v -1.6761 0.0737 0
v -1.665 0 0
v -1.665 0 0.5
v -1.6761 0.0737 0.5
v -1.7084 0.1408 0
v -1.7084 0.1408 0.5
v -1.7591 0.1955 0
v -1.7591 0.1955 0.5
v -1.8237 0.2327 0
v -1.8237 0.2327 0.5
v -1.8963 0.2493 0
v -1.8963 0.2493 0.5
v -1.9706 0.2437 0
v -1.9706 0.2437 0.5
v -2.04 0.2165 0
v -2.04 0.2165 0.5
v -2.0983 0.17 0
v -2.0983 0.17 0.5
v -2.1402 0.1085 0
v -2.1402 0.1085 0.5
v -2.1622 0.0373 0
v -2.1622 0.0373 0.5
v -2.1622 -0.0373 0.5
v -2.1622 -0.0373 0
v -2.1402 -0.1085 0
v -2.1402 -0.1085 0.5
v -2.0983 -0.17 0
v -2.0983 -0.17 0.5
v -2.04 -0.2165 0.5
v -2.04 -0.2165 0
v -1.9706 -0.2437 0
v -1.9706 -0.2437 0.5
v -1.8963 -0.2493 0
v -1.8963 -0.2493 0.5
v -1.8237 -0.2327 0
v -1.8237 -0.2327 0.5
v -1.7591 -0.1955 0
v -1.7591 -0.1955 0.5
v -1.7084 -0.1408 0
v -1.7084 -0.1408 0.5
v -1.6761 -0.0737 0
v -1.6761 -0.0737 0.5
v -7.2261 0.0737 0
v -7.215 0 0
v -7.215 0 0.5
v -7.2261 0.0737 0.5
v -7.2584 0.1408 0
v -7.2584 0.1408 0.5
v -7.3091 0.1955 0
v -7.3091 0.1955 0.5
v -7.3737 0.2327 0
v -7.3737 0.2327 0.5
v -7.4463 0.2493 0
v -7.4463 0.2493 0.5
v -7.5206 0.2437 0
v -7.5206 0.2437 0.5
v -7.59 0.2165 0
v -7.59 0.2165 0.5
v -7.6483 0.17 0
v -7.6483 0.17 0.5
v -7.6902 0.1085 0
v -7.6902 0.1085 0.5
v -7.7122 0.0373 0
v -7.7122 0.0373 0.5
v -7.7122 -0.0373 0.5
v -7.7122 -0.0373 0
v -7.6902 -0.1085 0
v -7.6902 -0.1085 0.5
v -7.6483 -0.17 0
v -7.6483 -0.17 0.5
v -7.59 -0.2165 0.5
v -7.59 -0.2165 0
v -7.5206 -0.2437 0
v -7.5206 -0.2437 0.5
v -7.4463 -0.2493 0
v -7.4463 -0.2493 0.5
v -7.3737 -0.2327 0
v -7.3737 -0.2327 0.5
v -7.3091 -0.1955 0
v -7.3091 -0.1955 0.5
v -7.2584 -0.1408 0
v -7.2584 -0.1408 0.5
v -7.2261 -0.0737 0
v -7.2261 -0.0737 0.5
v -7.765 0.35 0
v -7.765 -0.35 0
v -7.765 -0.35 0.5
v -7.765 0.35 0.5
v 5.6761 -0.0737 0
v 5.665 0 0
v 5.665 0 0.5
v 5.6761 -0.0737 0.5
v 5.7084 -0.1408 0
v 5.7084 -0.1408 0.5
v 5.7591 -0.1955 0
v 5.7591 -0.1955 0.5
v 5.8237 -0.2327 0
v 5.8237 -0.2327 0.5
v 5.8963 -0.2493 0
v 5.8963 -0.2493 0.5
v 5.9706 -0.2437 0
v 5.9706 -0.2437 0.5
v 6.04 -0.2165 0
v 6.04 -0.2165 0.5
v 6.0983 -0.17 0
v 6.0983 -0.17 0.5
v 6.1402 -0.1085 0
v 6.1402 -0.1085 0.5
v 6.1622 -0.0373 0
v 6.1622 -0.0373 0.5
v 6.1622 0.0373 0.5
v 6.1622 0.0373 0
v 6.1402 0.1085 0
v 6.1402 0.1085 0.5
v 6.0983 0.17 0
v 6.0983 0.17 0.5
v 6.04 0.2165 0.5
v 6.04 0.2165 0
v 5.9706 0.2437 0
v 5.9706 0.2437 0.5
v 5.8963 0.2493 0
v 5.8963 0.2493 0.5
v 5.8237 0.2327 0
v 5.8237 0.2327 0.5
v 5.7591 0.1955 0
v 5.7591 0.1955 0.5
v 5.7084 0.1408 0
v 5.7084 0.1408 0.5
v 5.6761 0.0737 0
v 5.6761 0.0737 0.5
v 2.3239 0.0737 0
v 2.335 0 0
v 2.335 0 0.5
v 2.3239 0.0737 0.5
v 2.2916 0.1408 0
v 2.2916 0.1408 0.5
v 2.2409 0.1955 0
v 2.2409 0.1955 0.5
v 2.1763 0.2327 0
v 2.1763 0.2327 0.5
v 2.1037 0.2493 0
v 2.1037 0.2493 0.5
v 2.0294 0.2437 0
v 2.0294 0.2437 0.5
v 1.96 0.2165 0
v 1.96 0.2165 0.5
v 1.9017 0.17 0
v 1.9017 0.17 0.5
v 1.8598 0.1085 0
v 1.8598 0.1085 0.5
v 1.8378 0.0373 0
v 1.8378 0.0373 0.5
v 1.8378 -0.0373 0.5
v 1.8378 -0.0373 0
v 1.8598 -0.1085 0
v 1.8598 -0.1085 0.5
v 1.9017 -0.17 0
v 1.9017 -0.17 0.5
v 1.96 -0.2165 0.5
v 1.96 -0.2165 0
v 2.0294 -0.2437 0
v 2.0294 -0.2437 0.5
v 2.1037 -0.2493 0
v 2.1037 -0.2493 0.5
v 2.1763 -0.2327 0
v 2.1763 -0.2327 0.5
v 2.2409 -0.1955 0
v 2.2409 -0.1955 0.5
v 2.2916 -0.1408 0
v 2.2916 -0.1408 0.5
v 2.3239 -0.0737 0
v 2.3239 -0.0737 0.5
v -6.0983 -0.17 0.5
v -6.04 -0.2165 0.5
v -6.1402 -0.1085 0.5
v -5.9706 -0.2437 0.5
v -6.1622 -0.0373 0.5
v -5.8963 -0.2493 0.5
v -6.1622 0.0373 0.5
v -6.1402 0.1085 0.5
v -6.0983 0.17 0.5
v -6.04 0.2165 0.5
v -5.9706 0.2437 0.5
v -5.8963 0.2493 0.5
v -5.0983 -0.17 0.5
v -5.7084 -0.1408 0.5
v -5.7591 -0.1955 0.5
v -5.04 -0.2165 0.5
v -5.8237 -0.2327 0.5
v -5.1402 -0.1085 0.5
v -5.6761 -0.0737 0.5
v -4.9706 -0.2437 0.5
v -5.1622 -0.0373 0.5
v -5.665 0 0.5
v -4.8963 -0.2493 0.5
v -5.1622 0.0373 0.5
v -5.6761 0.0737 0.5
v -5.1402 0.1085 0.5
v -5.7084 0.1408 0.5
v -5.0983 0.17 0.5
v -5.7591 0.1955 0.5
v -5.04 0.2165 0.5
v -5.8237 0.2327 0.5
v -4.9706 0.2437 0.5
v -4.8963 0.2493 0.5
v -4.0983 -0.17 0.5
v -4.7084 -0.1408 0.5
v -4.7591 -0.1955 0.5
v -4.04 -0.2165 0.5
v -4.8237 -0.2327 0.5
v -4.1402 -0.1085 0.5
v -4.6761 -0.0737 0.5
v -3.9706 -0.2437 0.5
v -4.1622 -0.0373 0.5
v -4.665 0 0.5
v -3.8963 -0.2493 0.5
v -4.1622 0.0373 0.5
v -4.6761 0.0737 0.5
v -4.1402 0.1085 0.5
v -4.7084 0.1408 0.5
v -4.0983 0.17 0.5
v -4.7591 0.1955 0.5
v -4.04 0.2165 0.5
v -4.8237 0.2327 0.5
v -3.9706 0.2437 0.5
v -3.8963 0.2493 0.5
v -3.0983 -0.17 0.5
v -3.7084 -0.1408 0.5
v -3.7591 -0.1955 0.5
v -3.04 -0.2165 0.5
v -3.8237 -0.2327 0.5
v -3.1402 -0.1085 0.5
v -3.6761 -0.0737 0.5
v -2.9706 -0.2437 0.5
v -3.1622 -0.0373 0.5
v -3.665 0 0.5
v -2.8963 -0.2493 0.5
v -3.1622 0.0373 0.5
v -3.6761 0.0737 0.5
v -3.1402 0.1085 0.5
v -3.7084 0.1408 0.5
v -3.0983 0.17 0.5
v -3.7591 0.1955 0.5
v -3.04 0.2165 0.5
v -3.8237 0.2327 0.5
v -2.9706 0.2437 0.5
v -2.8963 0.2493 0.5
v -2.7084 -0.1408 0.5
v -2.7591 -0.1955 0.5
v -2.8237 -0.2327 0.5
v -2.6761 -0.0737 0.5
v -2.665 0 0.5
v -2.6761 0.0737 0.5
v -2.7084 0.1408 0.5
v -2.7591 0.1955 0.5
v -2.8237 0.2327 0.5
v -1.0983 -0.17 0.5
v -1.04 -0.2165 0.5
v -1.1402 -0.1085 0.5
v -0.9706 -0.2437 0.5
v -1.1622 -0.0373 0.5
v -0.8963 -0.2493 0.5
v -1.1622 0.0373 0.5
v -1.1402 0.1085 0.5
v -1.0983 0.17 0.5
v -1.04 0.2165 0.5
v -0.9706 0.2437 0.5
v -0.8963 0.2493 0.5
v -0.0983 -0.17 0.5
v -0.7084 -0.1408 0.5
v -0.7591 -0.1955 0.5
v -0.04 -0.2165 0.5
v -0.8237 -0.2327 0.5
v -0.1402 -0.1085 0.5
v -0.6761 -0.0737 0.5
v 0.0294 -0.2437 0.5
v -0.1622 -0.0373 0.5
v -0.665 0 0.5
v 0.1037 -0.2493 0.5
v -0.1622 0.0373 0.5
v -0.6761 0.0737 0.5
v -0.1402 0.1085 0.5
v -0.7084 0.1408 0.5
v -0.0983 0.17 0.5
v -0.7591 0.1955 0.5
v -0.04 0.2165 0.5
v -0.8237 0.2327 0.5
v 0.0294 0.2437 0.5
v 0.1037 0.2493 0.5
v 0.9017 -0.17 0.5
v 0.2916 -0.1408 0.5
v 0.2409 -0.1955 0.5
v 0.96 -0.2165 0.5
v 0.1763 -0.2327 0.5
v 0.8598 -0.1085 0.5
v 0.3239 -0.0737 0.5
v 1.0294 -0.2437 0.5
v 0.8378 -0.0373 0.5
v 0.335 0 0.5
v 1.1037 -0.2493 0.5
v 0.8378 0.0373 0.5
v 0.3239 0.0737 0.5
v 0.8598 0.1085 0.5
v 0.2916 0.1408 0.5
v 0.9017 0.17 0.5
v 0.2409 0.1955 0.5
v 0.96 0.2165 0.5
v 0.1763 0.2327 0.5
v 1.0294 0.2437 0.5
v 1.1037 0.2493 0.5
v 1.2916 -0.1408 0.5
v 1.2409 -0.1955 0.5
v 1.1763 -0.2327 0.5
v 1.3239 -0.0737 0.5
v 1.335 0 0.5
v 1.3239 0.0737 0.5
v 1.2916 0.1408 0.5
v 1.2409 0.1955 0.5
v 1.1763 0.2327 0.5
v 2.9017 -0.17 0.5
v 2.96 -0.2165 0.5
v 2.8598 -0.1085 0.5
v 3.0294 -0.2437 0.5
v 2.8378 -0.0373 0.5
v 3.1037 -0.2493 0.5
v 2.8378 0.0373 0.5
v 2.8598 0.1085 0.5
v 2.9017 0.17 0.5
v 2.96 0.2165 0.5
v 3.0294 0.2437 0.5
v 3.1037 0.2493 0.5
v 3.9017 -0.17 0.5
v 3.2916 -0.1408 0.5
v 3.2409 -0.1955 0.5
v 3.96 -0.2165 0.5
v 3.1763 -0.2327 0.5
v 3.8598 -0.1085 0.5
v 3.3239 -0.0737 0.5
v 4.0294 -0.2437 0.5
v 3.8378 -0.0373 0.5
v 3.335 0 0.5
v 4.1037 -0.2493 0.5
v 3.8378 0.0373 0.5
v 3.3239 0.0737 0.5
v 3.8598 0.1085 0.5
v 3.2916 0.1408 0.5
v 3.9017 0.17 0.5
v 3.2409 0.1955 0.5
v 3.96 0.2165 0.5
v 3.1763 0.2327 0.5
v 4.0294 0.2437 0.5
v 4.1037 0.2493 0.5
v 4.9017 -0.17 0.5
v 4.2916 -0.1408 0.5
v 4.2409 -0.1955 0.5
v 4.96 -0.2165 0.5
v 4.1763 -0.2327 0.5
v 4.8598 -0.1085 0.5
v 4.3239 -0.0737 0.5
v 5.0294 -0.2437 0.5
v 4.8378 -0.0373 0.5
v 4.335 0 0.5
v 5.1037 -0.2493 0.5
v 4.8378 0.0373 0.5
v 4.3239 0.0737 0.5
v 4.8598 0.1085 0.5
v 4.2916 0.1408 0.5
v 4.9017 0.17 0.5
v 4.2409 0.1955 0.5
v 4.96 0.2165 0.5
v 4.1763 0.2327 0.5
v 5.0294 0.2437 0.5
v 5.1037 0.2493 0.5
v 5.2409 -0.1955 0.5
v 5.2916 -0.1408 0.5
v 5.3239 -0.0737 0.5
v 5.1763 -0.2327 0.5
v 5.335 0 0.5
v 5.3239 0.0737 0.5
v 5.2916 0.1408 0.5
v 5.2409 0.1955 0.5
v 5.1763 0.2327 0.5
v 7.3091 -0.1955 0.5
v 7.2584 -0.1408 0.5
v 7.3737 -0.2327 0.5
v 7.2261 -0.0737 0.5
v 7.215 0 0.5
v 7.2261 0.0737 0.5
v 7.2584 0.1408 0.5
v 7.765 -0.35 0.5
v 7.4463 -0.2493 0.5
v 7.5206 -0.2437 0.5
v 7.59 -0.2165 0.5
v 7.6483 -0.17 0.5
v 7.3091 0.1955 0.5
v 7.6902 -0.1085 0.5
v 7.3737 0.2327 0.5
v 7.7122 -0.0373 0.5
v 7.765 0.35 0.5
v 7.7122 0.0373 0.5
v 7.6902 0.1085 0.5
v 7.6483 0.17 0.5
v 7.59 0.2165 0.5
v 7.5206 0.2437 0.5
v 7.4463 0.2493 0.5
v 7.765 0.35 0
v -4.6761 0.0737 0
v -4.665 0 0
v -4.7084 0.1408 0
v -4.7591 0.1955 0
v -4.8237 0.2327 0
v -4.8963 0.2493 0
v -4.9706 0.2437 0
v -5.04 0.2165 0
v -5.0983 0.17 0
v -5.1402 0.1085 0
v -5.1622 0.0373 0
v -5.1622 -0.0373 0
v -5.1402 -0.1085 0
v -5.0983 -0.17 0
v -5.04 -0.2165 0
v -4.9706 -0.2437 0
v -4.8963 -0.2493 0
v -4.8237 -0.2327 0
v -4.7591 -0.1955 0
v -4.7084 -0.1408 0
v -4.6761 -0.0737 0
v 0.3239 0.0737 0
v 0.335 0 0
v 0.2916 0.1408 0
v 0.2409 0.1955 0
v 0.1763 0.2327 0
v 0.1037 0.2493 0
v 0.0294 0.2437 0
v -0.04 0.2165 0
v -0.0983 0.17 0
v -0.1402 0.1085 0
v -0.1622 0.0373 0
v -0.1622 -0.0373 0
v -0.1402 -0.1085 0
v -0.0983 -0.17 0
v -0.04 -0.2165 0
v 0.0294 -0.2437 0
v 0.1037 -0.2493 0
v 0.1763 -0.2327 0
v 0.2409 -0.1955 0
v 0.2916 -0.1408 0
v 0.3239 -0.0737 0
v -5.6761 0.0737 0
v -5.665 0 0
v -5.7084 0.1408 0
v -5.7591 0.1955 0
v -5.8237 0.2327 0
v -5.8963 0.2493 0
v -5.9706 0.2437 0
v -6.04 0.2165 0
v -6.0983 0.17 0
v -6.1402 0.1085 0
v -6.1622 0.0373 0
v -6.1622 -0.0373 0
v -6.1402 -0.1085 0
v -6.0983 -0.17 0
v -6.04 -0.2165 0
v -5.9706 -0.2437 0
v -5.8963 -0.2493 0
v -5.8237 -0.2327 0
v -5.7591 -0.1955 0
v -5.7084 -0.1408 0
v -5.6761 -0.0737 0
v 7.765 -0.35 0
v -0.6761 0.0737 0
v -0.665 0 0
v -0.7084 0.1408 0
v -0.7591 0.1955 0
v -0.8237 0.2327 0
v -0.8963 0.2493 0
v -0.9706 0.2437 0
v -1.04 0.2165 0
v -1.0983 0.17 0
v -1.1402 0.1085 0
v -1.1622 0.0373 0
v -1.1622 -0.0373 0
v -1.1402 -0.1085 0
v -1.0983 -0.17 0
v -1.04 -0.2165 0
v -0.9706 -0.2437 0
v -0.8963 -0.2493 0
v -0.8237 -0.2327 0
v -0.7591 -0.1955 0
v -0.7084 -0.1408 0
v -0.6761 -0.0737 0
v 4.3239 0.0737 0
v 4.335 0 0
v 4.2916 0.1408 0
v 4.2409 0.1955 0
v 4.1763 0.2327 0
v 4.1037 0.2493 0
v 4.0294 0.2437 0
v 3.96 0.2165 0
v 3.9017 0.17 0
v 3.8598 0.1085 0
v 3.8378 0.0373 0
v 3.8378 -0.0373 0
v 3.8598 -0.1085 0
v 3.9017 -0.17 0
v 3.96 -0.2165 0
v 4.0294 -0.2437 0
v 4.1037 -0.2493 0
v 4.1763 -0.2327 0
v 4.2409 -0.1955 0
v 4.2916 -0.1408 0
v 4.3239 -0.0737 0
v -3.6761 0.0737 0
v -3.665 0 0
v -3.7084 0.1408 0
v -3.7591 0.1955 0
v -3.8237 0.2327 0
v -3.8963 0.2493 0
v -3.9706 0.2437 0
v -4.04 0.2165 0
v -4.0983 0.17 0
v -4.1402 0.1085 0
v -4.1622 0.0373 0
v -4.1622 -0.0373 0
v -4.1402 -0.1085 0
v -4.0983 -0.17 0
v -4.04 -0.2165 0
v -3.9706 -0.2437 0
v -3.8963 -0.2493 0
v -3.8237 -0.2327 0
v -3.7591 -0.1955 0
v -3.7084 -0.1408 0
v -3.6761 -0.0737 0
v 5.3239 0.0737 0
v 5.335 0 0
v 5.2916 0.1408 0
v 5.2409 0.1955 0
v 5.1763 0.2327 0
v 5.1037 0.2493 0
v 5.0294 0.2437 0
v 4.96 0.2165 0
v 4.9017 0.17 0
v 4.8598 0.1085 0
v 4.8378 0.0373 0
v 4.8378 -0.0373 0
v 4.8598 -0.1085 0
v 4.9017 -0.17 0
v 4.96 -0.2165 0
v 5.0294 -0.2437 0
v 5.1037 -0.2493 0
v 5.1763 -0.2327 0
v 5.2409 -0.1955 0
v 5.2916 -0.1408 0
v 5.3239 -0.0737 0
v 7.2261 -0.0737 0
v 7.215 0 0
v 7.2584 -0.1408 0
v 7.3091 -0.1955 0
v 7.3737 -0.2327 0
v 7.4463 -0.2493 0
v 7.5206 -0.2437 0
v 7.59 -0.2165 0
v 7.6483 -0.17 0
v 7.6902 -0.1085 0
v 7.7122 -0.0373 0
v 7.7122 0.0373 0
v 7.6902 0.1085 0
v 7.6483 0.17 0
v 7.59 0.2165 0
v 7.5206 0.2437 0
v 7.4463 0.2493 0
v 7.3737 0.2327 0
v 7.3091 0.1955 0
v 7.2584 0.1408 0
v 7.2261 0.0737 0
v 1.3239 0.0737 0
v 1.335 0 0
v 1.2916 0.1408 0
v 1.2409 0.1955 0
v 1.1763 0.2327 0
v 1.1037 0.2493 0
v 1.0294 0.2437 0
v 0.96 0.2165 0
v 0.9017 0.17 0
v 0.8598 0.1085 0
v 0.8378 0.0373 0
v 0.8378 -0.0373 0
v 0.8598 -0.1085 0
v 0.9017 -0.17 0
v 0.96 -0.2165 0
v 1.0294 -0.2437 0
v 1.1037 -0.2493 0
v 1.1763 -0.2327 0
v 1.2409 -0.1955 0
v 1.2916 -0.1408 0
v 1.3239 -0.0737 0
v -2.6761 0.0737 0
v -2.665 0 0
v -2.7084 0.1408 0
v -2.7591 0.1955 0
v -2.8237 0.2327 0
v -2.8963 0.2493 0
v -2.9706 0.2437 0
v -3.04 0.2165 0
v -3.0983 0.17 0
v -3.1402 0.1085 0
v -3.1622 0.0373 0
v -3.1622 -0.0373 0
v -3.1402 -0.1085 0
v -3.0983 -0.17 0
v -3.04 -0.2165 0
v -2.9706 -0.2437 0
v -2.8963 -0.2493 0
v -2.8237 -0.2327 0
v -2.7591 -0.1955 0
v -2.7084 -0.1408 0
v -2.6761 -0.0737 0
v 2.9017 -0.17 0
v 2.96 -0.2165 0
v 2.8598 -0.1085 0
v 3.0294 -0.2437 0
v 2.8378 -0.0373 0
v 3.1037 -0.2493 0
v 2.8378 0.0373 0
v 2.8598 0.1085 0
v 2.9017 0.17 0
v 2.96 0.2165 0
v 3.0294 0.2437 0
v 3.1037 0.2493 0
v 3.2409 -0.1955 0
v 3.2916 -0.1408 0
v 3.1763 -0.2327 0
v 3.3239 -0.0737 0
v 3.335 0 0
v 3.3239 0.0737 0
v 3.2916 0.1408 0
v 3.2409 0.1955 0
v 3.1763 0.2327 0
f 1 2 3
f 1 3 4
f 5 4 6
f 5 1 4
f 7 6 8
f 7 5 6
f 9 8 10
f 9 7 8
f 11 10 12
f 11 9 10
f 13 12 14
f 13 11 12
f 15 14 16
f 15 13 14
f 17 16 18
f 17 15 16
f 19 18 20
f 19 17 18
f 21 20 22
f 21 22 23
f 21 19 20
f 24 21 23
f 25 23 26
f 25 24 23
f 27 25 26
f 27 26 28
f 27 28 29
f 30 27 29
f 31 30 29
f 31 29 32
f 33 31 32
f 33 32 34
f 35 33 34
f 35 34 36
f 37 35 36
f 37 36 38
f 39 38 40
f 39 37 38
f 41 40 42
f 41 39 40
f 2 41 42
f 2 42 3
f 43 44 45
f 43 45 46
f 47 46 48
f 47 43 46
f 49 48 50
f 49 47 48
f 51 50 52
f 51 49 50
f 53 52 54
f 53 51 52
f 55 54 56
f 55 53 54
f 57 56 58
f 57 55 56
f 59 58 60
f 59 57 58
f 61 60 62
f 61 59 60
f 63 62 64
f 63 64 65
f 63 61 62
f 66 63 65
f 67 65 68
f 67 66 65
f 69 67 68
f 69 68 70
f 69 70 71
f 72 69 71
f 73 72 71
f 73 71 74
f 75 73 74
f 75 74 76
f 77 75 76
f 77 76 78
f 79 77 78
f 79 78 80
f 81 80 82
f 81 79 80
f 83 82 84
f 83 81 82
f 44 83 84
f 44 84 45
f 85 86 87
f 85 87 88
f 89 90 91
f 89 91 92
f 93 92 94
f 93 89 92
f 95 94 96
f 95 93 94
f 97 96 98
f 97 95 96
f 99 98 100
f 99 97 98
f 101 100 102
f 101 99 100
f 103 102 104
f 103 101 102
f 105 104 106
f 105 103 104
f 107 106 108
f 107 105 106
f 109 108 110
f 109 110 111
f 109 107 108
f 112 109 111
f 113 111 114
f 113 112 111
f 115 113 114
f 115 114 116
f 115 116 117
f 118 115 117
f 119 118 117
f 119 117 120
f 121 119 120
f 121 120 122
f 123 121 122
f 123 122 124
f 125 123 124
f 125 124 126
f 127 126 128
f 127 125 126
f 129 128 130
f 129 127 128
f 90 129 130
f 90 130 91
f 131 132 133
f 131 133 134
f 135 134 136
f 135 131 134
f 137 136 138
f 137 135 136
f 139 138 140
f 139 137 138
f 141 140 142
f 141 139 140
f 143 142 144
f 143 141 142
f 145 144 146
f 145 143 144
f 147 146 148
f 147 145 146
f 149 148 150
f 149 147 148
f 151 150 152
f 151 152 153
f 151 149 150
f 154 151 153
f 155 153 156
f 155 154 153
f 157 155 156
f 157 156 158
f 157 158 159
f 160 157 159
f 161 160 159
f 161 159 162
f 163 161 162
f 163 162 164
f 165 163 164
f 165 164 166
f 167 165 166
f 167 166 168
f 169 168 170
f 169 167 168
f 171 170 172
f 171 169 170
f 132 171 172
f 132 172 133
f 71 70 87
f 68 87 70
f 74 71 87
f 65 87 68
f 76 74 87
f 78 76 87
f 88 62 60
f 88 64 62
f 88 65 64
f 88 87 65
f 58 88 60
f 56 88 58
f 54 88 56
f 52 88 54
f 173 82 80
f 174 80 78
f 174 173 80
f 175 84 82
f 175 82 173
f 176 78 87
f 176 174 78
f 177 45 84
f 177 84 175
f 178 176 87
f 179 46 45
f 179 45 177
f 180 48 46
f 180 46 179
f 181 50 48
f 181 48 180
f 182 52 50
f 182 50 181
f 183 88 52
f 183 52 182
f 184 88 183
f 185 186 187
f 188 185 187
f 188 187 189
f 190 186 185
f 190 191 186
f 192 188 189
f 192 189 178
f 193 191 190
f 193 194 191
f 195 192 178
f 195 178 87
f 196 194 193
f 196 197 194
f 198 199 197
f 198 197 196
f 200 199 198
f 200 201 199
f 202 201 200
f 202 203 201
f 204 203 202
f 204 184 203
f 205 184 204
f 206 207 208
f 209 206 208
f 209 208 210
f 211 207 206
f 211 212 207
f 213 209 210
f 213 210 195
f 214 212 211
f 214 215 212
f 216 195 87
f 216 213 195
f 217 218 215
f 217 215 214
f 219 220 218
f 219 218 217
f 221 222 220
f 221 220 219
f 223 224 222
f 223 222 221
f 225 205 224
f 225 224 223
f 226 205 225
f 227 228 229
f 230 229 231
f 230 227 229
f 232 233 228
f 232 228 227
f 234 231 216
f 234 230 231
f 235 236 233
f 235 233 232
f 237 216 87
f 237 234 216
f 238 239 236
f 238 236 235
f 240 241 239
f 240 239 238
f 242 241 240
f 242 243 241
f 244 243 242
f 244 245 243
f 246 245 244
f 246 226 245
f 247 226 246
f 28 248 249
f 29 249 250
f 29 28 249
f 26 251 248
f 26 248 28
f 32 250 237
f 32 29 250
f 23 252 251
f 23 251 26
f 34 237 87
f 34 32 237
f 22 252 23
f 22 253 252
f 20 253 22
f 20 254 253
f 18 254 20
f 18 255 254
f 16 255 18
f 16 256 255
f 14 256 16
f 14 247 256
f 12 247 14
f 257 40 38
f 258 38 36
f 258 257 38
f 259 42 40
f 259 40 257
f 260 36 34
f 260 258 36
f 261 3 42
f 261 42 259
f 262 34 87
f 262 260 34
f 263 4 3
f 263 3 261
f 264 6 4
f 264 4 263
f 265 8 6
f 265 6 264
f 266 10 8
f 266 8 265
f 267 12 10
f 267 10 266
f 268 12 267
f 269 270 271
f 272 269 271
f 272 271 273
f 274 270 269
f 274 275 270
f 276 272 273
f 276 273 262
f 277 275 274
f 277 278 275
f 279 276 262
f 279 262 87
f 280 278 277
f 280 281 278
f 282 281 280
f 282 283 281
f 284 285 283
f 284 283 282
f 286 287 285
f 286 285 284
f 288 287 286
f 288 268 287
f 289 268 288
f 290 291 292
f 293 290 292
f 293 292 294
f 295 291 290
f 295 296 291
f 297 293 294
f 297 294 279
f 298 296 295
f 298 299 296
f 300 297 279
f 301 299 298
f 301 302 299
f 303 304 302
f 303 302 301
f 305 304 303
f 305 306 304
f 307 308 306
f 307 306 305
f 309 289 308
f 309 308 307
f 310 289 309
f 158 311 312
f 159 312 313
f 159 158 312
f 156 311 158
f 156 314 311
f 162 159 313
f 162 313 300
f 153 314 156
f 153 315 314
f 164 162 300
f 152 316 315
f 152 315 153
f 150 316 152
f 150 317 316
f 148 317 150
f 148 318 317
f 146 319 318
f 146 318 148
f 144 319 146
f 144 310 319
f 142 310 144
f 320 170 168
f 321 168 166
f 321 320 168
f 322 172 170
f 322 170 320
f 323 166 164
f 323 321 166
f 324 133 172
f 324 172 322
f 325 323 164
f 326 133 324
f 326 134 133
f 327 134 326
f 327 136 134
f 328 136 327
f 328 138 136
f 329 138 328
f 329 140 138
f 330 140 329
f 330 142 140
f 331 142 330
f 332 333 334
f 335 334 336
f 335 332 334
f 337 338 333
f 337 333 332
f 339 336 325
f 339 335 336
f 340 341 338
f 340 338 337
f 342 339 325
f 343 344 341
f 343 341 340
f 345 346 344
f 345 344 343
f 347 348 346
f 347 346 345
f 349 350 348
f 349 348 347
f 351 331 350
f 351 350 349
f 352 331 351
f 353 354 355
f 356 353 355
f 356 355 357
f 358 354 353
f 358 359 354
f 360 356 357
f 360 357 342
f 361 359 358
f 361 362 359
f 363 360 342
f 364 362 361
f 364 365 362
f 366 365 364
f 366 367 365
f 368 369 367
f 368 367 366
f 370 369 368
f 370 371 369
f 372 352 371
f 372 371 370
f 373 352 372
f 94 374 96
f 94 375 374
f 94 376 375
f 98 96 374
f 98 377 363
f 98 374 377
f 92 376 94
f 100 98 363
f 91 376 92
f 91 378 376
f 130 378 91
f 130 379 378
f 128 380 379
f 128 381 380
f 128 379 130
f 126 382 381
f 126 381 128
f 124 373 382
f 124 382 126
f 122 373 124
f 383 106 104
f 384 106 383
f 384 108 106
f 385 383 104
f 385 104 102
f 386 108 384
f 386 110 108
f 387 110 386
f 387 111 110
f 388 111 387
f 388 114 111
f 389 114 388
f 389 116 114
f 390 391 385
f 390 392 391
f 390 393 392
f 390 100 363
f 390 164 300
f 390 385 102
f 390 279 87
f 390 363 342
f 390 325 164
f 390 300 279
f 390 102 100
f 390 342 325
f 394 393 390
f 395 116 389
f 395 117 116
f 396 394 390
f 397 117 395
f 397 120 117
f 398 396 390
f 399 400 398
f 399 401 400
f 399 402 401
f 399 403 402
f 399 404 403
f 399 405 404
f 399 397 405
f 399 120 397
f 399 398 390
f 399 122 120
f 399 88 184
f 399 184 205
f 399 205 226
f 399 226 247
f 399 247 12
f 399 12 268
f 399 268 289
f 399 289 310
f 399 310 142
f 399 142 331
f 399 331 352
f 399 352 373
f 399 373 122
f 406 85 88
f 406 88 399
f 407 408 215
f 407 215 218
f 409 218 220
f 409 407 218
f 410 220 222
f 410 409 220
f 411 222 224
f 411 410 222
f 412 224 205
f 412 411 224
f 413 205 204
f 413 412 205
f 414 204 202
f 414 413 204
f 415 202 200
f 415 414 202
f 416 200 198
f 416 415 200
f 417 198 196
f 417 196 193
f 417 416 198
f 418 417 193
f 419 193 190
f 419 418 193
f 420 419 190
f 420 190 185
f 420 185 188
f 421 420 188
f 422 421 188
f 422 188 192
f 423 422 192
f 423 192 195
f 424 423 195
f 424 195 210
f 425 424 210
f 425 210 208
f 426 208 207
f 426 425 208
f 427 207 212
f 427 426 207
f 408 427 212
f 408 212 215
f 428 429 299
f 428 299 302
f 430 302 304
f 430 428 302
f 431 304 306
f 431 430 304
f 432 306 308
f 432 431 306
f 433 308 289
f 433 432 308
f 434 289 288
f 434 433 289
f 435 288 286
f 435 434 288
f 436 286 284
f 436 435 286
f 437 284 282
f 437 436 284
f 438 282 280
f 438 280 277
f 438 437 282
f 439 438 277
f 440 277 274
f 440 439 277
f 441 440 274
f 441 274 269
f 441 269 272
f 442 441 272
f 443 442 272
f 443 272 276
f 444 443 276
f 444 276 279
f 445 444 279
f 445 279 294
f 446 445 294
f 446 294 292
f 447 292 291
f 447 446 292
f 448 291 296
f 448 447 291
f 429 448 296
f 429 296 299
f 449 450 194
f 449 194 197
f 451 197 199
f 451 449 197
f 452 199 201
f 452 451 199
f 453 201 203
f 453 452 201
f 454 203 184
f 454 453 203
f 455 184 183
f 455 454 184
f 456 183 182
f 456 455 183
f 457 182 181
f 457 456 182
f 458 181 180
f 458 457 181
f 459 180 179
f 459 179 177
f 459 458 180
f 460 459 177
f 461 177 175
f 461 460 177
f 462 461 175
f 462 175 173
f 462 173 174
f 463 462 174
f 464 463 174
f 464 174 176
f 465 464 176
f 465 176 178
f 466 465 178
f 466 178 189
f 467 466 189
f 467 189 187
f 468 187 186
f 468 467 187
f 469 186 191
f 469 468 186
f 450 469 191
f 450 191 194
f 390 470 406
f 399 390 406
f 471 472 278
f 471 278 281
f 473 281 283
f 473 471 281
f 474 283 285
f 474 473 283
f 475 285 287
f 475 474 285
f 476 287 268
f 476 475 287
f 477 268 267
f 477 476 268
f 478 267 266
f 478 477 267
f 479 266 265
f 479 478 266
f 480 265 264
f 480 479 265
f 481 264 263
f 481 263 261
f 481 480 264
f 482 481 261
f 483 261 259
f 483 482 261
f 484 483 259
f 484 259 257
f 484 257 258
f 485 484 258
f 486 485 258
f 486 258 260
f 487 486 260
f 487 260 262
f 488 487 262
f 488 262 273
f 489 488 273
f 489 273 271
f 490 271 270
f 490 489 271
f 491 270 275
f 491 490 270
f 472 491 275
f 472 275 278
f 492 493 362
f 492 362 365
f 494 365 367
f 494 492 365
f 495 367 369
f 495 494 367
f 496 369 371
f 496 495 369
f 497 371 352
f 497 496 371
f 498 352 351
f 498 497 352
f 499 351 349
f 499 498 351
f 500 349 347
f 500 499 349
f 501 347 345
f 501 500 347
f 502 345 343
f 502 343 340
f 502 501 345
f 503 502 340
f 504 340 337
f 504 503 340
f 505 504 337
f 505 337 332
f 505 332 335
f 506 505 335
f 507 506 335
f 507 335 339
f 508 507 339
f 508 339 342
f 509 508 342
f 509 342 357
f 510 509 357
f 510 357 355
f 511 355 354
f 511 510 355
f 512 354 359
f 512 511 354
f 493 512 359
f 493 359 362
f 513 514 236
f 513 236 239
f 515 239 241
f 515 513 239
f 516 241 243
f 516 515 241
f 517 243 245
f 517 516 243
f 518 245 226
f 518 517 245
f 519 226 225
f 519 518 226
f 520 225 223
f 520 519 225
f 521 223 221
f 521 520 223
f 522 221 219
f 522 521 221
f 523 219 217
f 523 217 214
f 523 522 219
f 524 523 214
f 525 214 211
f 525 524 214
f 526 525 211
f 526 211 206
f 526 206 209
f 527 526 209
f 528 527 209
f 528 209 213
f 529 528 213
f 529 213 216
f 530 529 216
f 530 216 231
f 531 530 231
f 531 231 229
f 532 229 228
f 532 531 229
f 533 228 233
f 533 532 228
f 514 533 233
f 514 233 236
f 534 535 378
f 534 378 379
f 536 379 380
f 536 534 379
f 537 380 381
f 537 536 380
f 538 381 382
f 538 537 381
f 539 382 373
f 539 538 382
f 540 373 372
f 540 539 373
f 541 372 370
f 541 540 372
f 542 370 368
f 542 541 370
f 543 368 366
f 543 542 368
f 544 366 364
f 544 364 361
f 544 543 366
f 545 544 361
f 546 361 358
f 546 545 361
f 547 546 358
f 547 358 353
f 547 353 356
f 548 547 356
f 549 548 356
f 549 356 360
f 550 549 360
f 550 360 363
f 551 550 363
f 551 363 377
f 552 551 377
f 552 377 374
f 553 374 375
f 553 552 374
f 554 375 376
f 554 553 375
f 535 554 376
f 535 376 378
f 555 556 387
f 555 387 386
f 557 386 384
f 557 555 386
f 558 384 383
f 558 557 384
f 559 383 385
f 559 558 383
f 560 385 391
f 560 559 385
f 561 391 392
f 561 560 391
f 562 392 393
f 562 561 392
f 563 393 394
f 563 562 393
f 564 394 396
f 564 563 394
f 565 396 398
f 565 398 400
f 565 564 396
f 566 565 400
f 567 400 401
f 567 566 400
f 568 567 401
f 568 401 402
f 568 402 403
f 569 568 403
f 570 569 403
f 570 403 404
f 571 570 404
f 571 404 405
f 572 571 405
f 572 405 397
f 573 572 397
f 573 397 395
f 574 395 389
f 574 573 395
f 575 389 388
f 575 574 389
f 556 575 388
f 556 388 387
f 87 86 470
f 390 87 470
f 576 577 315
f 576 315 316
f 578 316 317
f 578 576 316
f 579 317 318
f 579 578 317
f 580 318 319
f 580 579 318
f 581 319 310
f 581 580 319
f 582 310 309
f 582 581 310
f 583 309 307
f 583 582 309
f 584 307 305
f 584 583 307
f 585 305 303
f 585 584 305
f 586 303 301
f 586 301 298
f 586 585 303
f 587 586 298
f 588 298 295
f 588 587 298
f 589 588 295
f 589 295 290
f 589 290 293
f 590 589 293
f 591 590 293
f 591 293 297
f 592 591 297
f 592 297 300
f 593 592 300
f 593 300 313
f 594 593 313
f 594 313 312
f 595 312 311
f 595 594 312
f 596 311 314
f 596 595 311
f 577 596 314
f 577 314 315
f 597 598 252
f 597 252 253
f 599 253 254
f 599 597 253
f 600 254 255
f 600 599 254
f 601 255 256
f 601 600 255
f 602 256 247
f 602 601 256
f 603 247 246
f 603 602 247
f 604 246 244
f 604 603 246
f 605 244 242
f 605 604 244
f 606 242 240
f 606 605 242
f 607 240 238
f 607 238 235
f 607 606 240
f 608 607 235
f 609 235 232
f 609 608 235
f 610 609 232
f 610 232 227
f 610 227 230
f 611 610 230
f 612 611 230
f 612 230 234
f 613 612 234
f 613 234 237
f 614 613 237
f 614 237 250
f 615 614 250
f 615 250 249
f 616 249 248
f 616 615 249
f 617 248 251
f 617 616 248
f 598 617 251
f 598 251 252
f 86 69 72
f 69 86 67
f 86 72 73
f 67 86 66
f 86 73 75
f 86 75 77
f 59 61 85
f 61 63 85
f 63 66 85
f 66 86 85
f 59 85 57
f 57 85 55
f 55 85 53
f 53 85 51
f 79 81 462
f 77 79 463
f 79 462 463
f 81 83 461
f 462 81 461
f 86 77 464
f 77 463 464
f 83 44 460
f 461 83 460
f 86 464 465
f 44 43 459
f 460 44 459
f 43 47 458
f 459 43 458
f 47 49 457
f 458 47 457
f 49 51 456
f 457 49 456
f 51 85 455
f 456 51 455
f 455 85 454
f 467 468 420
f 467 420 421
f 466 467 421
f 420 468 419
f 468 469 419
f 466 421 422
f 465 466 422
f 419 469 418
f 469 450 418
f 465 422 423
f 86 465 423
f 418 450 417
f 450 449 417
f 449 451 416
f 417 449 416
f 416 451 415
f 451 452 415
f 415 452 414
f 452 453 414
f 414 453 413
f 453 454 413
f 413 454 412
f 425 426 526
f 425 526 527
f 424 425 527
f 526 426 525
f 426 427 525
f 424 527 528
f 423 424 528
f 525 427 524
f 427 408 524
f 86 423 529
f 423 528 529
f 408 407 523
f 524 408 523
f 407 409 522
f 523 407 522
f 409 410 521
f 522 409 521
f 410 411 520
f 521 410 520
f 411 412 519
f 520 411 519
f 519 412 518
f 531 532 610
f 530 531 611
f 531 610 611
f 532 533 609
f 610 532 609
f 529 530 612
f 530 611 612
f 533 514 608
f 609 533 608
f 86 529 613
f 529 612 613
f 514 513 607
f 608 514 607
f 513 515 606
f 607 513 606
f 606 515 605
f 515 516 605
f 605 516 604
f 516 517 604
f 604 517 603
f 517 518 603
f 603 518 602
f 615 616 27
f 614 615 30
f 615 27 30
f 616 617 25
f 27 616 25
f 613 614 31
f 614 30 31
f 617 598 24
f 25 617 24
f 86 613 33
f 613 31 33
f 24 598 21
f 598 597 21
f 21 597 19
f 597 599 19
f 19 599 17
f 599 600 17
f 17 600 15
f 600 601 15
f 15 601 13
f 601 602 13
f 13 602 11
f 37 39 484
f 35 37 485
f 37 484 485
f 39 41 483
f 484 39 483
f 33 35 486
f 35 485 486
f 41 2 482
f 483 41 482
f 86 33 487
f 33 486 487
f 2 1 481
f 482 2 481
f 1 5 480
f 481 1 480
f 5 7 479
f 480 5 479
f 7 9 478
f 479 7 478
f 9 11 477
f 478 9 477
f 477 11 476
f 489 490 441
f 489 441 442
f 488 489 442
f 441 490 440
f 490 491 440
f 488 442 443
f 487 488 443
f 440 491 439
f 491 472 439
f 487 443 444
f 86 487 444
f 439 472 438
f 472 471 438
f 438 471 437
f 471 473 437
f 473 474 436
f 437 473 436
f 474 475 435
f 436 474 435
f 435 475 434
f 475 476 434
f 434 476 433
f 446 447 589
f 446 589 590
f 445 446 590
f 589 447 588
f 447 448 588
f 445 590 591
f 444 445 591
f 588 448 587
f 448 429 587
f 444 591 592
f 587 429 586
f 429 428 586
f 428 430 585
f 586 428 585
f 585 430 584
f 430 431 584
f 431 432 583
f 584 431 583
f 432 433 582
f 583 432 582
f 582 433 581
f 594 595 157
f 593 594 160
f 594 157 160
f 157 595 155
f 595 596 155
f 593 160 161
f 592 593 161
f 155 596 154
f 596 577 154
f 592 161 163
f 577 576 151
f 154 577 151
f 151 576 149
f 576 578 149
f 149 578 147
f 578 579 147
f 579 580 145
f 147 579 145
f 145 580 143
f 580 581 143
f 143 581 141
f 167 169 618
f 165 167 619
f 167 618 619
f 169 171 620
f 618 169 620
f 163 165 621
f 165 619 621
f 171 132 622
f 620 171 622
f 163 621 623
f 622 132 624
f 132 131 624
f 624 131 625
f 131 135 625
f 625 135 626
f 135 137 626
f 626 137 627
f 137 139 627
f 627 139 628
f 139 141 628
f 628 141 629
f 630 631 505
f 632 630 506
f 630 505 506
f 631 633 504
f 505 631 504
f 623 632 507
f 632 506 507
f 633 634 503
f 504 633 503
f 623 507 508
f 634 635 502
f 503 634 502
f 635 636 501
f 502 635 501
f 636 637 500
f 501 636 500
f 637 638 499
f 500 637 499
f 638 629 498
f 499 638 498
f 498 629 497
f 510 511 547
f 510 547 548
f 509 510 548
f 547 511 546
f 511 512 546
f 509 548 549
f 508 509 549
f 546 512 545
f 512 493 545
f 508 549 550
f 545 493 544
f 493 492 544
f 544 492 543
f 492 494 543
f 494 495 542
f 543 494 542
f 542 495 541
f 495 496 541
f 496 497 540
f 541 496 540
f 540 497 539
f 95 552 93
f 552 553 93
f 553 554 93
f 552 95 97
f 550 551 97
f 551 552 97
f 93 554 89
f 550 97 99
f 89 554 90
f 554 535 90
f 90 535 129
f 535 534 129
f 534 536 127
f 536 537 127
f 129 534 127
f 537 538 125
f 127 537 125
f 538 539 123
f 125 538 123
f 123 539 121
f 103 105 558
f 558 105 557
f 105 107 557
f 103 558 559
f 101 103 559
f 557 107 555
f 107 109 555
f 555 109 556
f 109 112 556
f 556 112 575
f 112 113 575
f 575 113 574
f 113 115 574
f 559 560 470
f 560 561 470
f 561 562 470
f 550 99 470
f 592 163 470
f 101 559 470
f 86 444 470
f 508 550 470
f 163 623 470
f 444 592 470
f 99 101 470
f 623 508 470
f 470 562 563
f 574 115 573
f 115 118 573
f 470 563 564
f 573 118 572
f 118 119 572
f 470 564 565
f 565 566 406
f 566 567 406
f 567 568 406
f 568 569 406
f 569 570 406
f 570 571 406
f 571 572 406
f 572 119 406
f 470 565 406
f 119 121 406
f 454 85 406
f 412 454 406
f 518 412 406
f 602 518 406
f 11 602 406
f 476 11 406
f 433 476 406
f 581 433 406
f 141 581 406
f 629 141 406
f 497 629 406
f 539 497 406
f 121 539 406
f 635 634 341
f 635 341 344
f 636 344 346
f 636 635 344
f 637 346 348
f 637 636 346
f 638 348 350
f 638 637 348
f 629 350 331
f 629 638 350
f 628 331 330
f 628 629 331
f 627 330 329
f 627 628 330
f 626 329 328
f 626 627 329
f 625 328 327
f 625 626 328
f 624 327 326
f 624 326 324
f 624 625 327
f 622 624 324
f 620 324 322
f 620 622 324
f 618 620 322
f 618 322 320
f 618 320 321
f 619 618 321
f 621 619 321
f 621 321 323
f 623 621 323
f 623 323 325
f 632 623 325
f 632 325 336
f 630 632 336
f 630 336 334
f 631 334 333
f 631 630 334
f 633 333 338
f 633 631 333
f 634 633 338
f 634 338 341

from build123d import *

# Parameters (mm, degrees)
SKETCH1_W           = 15.53
SKETCH1_H           = 0.7
SKETCH1_R           = 0.25
BOSS_EXTRUDE1_DEPTH = 0.5


with BuildPart() as part:
    # Sketch1 → Boss-Extrude1 (new body)
    with BuildSketch(Plane.XY):
        Rectangle(SKETCH1_W, SKETCH1_H)
        with Locations((-7.465, 0)):
            Circle(SKETCH1_R, mode=Mode.SUBTRACT)
        with Locations((-5.915, 0)):
            Circle(SKETCH1_R, mode=Mode.SUBTRACT)
        with Locations(Location((5.915, 0, 0), (0, 0, 180))):
            Circle(SKETCH1_R, mode=Mode.SUBTRACT)
        with Locations(Location((7.465, 0, 0), (0, 0, 180))):
            Circle(SKETCH1_R, mode=Mode.SUBTRACT)
        with Locations((-4.915, 0)):
            Circle(SKETCH1_R, mode=Mode.SUBTRACT)
        with Locations((-3.915, 0)):
            Circle(SKETCH1_R, mode=Mode.SUBTRACT)
        with Locations((-2.915, 0)):
            Circle(SKETCH1_R, mode=Mode.SUBTRACT)
        with Locations((-1.915, 0)):
            Circle(SKETCH1_R, mode=Mode.SUBTRACT)
        with Locations((-0.915, 0)):
            Circle(SKETCH1_R, mode=Mode.SUBTRACT)
        with Locations((0.085, 0)):
            Circle(SKETCH1_R, mode=Mode.SUBTRACT)
        with Locations((1.085, 0)):
            Circle(SKETCH1_R, mode=Mode.SUBTRACT)
        with Locations((2.085, 0)):
            Circle(SKETCH1_R, mode=Mode.SUBTRACT)
        with Locations((3.085, 0)):
            Circle(SKETCH1_R, mode=Mode.SUBTRACT)
        with Locations((4.085, 0)):
            Circle(SKETCH1_R, mode=Mode.SUBTRACT)
        with Locations((5.085, 0)):
            Circle(SKETCH1_R, mode=Mode.SUBTRACT)
    extrude(amount=BOSS_EXTRUDE1_DEPTH)


solid = part.part
